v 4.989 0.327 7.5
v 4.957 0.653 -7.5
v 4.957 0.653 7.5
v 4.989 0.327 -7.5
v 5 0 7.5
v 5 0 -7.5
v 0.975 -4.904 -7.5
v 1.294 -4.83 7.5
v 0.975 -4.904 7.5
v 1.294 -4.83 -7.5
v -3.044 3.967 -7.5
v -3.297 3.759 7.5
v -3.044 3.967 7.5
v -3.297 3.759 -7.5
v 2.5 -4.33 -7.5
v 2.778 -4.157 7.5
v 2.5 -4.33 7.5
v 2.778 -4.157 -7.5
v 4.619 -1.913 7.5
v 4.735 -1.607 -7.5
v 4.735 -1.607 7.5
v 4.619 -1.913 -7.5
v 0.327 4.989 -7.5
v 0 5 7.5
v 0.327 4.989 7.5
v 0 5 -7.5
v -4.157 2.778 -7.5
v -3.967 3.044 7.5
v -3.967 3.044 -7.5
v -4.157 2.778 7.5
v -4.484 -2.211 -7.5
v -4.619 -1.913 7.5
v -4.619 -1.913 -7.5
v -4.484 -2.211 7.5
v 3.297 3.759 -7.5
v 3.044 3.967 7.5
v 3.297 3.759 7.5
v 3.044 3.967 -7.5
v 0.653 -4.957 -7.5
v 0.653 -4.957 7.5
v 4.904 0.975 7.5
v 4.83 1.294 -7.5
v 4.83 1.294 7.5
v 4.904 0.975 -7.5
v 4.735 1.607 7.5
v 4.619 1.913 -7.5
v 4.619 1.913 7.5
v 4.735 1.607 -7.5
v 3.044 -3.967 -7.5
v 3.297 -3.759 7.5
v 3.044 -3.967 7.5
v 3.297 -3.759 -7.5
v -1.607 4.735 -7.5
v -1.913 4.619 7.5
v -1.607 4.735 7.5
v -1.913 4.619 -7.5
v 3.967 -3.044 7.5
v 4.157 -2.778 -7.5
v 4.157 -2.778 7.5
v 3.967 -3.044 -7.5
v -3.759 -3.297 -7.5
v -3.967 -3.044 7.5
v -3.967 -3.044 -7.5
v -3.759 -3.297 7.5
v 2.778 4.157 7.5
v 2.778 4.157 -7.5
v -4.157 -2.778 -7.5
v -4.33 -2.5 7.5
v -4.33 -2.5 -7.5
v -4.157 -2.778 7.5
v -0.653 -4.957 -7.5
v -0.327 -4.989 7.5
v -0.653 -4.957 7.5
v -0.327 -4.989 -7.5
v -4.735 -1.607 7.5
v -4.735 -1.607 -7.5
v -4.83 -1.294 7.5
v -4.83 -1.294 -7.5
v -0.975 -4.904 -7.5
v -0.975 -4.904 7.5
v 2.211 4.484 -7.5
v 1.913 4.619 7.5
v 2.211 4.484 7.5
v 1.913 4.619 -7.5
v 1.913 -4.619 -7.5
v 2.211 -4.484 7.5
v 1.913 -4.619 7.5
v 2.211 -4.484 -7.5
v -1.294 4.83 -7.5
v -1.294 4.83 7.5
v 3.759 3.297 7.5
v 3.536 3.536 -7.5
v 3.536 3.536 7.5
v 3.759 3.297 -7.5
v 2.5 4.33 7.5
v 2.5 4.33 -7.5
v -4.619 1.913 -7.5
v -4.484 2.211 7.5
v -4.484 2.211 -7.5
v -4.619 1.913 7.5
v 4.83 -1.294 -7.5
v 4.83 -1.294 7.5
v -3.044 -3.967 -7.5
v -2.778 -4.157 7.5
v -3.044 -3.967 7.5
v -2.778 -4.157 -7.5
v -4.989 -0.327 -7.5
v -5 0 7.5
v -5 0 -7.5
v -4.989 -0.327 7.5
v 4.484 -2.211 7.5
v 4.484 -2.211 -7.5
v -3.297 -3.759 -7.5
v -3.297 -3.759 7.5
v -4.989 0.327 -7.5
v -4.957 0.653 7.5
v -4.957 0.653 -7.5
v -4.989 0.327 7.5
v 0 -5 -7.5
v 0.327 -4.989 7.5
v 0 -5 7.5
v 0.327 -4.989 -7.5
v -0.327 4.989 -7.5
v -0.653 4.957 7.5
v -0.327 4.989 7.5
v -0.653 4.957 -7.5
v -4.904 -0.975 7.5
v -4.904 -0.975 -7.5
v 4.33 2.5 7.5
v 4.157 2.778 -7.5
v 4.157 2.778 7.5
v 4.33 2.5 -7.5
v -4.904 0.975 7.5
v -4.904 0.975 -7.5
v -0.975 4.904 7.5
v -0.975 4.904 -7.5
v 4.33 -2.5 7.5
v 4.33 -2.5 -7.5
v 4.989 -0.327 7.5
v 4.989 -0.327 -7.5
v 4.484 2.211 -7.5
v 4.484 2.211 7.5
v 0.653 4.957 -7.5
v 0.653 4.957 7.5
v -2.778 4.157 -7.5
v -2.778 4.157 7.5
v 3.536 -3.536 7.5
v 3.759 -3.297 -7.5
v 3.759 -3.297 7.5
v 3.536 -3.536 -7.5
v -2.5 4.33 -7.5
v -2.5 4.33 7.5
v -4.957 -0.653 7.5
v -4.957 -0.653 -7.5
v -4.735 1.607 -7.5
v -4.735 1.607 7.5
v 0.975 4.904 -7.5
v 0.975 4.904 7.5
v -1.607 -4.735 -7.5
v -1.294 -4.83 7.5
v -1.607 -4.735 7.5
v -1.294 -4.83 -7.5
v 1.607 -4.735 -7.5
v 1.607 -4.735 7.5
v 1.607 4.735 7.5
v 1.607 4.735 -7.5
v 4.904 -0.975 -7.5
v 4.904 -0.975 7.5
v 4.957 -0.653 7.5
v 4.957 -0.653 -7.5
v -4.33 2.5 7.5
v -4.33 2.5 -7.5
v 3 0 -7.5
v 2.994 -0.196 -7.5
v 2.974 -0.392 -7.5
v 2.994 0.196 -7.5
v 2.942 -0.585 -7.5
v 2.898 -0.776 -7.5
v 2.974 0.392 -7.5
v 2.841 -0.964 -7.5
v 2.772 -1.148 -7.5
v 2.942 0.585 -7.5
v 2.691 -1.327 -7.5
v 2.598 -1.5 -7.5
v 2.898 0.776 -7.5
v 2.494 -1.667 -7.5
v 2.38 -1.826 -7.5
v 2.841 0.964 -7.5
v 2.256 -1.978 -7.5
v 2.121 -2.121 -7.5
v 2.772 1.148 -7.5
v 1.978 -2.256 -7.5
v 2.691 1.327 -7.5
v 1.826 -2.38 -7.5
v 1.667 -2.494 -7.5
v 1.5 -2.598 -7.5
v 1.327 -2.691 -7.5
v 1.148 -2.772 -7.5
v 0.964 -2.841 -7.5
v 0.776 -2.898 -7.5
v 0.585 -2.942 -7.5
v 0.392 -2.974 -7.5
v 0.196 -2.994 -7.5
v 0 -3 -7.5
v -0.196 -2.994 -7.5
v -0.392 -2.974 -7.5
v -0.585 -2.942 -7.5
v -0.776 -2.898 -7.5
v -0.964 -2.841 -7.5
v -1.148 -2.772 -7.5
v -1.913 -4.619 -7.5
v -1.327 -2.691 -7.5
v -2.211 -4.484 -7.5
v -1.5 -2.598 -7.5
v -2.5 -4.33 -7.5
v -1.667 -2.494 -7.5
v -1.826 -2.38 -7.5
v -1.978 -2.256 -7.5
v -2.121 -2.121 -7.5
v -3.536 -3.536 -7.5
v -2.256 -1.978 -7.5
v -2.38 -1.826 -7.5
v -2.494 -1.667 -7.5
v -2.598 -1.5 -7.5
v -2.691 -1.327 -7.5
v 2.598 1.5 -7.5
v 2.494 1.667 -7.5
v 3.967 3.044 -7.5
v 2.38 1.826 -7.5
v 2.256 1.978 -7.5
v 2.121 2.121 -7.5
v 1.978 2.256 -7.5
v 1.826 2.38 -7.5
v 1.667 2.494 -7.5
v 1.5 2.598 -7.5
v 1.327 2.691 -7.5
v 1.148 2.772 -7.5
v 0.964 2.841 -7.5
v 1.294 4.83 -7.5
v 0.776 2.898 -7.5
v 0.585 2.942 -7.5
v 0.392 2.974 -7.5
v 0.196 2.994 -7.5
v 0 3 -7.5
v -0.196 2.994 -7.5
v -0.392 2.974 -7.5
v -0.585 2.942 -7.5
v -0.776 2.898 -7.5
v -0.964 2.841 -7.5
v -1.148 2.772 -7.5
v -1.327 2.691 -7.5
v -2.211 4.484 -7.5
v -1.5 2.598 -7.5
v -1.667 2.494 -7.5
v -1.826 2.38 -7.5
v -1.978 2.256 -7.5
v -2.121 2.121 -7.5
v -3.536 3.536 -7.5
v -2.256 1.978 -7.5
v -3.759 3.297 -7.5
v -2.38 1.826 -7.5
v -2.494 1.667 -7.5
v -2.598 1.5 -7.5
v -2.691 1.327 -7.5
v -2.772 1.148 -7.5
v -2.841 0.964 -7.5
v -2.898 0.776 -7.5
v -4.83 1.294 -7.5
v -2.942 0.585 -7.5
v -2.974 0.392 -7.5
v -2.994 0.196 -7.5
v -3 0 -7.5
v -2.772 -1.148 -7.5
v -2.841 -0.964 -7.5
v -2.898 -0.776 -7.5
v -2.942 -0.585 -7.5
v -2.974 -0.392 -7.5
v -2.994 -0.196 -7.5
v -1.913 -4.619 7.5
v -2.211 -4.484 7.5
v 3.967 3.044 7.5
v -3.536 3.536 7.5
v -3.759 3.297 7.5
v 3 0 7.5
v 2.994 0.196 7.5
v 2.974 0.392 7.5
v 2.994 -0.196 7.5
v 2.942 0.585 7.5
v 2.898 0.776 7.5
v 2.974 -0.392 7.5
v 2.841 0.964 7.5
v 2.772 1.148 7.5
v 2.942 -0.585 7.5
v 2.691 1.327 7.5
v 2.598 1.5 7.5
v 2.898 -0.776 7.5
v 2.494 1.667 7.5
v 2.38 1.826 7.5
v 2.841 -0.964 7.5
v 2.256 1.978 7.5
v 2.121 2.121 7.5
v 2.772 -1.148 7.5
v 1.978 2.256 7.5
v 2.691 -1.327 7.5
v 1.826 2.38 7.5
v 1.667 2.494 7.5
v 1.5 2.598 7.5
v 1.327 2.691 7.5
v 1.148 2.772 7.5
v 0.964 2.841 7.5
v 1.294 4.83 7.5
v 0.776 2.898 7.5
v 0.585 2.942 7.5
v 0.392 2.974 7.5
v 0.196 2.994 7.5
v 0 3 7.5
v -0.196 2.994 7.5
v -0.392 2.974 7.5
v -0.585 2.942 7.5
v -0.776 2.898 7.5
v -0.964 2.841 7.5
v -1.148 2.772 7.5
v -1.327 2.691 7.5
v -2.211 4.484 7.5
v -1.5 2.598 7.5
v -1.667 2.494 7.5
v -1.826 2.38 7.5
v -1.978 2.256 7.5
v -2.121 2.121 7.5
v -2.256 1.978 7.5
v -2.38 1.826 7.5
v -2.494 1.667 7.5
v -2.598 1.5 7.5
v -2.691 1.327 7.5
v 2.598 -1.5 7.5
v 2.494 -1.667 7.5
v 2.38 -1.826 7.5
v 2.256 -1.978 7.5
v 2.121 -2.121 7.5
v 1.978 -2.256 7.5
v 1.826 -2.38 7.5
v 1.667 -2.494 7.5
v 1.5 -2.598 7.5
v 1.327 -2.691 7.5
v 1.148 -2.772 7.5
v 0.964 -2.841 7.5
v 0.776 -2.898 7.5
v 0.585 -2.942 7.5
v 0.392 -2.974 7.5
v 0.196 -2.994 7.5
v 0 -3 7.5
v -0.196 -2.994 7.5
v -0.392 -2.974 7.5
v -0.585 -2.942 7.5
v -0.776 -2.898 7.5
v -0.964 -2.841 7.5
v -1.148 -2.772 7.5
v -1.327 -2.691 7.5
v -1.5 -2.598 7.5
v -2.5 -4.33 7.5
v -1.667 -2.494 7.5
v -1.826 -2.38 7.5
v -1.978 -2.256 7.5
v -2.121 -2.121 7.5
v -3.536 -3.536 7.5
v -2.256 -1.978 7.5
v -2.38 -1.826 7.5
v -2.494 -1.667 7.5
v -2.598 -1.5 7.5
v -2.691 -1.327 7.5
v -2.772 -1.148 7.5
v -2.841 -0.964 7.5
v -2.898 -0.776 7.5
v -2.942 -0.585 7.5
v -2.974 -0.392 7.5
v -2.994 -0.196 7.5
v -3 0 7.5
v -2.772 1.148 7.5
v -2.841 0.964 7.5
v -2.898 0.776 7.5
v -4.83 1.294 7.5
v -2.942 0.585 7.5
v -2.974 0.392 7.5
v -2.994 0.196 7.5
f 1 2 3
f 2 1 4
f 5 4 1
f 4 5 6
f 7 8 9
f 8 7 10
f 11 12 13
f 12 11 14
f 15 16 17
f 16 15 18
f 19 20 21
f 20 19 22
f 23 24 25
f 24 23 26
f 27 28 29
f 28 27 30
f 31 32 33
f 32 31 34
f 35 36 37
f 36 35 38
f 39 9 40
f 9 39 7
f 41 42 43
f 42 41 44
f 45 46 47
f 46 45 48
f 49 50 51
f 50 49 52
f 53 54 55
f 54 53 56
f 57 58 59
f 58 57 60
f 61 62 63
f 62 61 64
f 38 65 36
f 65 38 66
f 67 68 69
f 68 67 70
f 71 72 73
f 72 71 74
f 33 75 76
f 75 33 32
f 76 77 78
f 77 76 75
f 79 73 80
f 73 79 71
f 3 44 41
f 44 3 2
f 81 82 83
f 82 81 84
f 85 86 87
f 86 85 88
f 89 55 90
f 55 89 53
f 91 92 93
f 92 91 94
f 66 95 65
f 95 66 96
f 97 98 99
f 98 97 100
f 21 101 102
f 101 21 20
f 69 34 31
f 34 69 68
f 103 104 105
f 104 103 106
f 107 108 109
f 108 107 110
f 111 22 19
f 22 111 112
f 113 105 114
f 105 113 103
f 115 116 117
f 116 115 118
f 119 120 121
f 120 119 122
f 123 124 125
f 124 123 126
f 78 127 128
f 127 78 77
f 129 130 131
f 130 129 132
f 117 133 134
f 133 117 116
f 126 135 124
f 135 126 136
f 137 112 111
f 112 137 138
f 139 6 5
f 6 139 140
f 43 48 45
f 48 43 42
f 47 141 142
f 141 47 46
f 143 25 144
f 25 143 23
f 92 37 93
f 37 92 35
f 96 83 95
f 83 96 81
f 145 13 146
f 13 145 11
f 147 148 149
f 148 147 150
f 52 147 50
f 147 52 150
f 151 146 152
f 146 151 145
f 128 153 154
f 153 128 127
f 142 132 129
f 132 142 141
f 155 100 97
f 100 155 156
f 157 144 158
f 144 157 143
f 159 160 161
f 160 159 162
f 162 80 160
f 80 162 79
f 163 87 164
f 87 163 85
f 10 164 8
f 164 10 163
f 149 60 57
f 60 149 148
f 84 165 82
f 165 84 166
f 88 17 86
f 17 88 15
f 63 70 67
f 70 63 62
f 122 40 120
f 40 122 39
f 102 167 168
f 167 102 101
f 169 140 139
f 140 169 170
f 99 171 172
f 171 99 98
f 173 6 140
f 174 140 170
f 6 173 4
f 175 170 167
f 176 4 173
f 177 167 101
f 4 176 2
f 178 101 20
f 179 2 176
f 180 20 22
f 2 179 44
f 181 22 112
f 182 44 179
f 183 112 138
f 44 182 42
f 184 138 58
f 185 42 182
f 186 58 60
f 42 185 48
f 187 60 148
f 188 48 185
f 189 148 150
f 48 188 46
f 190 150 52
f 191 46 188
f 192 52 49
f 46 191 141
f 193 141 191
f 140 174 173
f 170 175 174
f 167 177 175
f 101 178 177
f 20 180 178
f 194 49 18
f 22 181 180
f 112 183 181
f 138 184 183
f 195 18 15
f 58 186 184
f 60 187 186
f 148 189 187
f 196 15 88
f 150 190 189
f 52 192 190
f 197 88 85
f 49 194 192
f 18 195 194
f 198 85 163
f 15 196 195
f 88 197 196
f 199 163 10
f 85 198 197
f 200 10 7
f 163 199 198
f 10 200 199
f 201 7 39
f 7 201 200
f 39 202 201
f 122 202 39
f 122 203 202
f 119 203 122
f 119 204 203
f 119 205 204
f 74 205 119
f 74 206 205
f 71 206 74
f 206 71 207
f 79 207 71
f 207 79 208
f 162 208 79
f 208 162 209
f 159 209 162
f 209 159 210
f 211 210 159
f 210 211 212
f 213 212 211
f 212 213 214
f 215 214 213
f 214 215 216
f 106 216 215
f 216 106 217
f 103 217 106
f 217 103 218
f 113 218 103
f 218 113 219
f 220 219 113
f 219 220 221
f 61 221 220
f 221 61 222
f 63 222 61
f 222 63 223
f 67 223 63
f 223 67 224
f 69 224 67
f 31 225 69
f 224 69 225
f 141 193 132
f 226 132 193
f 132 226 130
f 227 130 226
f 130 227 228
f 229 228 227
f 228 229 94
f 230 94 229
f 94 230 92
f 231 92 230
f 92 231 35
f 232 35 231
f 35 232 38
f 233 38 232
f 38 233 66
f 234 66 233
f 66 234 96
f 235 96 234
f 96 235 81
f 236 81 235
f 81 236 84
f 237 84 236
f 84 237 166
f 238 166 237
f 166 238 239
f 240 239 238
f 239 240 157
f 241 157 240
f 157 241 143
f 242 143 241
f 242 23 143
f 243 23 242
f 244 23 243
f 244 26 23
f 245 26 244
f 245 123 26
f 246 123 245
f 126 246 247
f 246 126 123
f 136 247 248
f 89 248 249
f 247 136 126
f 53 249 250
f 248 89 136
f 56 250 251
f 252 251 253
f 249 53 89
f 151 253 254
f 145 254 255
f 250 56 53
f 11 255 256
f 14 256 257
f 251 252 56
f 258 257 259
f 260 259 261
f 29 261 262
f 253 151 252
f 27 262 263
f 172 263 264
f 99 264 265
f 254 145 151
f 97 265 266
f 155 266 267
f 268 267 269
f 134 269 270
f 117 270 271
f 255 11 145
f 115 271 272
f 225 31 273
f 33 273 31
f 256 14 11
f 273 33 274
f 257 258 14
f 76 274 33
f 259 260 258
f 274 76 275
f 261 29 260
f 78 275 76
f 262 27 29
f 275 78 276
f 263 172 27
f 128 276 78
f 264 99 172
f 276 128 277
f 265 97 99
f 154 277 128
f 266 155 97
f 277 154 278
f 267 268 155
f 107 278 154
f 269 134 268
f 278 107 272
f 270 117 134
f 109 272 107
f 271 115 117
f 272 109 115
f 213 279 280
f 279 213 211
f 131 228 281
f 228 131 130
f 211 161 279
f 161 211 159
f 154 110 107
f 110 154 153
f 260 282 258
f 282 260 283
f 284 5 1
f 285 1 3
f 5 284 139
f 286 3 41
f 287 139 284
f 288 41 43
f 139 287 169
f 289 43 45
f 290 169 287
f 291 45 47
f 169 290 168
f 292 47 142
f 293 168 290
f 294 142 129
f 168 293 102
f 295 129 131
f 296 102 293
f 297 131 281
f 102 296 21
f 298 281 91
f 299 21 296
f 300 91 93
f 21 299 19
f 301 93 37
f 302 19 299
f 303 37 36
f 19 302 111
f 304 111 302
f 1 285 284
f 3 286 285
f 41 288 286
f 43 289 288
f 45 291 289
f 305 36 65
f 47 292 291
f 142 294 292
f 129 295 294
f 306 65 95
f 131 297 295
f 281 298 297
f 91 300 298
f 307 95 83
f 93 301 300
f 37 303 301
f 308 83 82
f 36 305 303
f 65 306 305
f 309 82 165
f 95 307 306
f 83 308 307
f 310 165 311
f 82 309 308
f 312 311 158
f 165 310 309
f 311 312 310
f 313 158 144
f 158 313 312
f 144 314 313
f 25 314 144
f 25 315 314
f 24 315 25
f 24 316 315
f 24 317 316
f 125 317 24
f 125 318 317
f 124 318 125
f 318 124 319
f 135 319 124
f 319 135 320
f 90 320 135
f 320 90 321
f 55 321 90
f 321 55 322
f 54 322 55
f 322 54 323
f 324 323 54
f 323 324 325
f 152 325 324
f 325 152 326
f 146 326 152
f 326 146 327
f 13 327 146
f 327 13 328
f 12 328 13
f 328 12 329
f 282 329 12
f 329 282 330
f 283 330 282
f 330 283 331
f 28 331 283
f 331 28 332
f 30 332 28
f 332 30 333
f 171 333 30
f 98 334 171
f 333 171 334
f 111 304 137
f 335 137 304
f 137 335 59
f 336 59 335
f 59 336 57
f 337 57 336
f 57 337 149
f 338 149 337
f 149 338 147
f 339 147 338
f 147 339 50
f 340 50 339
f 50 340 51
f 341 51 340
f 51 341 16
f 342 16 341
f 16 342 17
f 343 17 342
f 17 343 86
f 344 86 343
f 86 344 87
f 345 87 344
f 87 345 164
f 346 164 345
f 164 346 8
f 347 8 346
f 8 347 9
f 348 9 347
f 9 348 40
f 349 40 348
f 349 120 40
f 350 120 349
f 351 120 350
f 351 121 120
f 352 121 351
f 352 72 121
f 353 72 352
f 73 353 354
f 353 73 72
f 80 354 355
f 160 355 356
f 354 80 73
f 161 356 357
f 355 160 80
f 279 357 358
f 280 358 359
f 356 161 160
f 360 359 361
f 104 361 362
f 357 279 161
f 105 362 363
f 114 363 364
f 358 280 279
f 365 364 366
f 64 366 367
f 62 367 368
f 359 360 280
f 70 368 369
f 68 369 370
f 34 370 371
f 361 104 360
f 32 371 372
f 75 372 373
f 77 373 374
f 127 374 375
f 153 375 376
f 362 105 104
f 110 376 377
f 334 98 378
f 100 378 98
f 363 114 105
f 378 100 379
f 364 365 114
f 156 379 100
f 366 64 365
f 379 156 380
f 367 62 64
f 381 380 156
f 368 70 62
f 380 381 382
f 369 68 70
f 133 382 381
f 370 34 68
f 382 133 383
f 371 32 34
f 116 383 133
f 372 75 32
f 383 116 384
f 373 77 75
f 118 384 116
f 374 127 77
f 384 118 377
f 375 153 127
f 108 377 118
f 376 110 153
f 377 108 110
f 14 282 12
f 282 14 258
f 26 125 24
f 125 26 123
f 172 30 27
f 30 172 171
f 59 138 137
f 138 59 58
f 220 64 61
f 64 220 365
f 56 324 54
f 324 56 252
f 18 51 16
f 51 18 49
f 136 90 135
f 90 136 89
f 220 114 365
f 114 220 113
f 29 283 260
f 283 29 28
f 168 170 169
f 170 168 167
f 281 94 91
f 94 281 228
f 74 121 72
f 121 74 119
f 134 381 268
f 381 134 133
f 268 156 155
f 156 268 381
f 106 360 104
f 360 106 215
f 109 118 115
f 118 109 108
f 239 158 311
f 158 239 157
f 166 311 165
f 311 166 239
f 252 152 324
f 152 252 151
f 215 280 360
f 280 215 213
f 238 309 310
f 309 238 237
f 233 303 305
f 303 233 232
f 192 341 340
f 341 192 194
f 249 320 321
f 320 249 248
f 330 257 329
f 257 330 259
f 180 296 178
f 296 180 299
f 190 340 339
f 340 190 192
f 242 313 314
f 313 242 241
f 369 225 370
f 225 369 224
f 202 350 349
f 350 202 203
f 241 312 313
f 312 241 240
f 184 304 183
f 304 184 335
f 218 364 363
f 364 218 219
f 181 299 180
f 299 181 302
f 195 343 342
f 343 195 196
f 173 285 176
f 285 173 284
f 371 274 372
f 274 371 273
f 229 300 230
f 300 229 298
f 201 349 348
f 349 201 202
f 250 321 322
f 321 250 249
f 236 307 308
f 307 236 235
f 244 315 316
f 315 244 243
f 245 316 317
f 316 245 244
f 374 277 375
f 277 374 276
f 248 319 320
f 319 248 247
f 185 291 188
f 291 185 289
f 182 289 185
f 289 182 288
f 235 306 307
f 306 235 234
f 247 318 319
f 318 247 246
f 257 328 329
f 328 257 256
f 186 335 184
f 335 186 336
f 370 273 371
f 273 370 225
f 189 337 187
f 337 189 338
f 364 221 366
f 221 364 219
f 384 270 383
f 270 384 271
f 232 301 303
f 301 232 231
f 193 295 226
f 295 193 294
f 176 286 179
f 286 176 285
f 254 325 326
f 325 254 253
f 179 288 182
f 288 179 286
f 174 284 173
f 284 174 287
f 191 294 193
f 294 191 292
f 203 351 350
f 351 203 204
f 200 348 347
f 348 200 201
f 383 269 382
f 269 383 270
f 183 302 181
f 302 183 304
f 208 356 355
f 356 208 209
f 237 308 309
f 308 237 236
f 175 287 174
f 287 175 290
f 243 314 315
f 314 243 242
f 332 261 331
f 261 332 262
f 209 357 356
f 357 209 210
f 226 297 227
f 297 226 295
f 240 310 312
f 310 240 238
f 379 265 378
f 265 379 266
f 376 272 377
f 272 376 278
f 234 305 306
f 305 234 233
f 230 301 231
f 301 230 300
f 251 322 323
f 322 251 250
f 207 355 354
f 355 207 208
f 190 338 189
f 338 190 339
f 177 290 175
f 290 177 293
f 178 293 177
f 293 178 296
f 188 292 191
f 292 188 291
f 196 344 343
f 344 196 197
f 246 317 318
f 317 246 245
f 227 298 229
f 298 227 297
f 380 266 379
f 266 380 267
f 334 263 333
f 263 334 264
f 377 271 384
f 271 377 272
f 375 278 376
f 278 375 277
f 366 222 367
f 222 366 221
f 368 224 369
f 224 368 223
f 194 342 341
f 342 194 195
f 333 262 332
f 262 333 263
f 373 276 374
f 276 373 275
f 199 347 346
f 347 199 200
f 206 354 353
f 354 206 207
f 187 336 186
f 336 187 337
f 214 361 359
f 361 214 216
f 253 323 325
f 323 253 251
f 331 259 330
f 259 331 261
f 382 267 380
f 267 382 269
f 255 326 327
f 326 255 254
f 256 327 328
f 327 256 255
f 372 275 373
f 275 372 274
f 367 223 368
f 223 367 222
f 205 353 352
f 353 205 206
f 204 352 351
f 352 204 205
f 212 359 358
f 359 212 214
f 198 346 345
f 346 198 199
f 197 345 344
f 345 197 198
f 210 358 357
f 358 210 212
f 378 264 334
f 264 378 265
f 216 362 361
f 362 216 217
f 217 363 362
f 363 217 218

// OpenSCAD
// Neoprene tubing (single connected solid)

// Parameters
outer_diameter = 10; //[5:20:0.5]
inner_diameter = 6;  //[3:12:0.5]
length = 15;         //[8:30:1]
center = 1;          //[0:1:1]
forced_id = 0;       //[0:20:0.5]
eps = 0.2;           //[0.01:1:0.01]

// Smoothness
$fn = 96;

// Tubing geometry
module tubing(od, id, len, eps_local) {
    od2 = max(od, 0.01);
    id_req = (forced_id > 0) ? forced_id : id;

    // Keep a guaranteed minimum wall thickness per side
    min_wall = 0.1; // mm per side
    id2 = min(max(id_req, 0), od2 - 2*min_wall);

    // Ensure the inner cutter fully clears the outer cylinder in Z
    cut_h = len + 2*eps_local;

    color([0.2, 0.2, 0.2])  // Neoprene-like dark gray
    difference() {
        cylinder(h=len, r=od2/2, center=true);
        cylinder(h=cut_h, r=id2/2, center=true);
    }
}

// Assembly (centered or sitting on Z=0 plane)
module assembly() {
    z0 = (center == 1) ? 0 : (length/2);
    translate([0, 0, z0])
        tubing(outer_diameter, inner_diameter, length, eps);
}

assembly();
